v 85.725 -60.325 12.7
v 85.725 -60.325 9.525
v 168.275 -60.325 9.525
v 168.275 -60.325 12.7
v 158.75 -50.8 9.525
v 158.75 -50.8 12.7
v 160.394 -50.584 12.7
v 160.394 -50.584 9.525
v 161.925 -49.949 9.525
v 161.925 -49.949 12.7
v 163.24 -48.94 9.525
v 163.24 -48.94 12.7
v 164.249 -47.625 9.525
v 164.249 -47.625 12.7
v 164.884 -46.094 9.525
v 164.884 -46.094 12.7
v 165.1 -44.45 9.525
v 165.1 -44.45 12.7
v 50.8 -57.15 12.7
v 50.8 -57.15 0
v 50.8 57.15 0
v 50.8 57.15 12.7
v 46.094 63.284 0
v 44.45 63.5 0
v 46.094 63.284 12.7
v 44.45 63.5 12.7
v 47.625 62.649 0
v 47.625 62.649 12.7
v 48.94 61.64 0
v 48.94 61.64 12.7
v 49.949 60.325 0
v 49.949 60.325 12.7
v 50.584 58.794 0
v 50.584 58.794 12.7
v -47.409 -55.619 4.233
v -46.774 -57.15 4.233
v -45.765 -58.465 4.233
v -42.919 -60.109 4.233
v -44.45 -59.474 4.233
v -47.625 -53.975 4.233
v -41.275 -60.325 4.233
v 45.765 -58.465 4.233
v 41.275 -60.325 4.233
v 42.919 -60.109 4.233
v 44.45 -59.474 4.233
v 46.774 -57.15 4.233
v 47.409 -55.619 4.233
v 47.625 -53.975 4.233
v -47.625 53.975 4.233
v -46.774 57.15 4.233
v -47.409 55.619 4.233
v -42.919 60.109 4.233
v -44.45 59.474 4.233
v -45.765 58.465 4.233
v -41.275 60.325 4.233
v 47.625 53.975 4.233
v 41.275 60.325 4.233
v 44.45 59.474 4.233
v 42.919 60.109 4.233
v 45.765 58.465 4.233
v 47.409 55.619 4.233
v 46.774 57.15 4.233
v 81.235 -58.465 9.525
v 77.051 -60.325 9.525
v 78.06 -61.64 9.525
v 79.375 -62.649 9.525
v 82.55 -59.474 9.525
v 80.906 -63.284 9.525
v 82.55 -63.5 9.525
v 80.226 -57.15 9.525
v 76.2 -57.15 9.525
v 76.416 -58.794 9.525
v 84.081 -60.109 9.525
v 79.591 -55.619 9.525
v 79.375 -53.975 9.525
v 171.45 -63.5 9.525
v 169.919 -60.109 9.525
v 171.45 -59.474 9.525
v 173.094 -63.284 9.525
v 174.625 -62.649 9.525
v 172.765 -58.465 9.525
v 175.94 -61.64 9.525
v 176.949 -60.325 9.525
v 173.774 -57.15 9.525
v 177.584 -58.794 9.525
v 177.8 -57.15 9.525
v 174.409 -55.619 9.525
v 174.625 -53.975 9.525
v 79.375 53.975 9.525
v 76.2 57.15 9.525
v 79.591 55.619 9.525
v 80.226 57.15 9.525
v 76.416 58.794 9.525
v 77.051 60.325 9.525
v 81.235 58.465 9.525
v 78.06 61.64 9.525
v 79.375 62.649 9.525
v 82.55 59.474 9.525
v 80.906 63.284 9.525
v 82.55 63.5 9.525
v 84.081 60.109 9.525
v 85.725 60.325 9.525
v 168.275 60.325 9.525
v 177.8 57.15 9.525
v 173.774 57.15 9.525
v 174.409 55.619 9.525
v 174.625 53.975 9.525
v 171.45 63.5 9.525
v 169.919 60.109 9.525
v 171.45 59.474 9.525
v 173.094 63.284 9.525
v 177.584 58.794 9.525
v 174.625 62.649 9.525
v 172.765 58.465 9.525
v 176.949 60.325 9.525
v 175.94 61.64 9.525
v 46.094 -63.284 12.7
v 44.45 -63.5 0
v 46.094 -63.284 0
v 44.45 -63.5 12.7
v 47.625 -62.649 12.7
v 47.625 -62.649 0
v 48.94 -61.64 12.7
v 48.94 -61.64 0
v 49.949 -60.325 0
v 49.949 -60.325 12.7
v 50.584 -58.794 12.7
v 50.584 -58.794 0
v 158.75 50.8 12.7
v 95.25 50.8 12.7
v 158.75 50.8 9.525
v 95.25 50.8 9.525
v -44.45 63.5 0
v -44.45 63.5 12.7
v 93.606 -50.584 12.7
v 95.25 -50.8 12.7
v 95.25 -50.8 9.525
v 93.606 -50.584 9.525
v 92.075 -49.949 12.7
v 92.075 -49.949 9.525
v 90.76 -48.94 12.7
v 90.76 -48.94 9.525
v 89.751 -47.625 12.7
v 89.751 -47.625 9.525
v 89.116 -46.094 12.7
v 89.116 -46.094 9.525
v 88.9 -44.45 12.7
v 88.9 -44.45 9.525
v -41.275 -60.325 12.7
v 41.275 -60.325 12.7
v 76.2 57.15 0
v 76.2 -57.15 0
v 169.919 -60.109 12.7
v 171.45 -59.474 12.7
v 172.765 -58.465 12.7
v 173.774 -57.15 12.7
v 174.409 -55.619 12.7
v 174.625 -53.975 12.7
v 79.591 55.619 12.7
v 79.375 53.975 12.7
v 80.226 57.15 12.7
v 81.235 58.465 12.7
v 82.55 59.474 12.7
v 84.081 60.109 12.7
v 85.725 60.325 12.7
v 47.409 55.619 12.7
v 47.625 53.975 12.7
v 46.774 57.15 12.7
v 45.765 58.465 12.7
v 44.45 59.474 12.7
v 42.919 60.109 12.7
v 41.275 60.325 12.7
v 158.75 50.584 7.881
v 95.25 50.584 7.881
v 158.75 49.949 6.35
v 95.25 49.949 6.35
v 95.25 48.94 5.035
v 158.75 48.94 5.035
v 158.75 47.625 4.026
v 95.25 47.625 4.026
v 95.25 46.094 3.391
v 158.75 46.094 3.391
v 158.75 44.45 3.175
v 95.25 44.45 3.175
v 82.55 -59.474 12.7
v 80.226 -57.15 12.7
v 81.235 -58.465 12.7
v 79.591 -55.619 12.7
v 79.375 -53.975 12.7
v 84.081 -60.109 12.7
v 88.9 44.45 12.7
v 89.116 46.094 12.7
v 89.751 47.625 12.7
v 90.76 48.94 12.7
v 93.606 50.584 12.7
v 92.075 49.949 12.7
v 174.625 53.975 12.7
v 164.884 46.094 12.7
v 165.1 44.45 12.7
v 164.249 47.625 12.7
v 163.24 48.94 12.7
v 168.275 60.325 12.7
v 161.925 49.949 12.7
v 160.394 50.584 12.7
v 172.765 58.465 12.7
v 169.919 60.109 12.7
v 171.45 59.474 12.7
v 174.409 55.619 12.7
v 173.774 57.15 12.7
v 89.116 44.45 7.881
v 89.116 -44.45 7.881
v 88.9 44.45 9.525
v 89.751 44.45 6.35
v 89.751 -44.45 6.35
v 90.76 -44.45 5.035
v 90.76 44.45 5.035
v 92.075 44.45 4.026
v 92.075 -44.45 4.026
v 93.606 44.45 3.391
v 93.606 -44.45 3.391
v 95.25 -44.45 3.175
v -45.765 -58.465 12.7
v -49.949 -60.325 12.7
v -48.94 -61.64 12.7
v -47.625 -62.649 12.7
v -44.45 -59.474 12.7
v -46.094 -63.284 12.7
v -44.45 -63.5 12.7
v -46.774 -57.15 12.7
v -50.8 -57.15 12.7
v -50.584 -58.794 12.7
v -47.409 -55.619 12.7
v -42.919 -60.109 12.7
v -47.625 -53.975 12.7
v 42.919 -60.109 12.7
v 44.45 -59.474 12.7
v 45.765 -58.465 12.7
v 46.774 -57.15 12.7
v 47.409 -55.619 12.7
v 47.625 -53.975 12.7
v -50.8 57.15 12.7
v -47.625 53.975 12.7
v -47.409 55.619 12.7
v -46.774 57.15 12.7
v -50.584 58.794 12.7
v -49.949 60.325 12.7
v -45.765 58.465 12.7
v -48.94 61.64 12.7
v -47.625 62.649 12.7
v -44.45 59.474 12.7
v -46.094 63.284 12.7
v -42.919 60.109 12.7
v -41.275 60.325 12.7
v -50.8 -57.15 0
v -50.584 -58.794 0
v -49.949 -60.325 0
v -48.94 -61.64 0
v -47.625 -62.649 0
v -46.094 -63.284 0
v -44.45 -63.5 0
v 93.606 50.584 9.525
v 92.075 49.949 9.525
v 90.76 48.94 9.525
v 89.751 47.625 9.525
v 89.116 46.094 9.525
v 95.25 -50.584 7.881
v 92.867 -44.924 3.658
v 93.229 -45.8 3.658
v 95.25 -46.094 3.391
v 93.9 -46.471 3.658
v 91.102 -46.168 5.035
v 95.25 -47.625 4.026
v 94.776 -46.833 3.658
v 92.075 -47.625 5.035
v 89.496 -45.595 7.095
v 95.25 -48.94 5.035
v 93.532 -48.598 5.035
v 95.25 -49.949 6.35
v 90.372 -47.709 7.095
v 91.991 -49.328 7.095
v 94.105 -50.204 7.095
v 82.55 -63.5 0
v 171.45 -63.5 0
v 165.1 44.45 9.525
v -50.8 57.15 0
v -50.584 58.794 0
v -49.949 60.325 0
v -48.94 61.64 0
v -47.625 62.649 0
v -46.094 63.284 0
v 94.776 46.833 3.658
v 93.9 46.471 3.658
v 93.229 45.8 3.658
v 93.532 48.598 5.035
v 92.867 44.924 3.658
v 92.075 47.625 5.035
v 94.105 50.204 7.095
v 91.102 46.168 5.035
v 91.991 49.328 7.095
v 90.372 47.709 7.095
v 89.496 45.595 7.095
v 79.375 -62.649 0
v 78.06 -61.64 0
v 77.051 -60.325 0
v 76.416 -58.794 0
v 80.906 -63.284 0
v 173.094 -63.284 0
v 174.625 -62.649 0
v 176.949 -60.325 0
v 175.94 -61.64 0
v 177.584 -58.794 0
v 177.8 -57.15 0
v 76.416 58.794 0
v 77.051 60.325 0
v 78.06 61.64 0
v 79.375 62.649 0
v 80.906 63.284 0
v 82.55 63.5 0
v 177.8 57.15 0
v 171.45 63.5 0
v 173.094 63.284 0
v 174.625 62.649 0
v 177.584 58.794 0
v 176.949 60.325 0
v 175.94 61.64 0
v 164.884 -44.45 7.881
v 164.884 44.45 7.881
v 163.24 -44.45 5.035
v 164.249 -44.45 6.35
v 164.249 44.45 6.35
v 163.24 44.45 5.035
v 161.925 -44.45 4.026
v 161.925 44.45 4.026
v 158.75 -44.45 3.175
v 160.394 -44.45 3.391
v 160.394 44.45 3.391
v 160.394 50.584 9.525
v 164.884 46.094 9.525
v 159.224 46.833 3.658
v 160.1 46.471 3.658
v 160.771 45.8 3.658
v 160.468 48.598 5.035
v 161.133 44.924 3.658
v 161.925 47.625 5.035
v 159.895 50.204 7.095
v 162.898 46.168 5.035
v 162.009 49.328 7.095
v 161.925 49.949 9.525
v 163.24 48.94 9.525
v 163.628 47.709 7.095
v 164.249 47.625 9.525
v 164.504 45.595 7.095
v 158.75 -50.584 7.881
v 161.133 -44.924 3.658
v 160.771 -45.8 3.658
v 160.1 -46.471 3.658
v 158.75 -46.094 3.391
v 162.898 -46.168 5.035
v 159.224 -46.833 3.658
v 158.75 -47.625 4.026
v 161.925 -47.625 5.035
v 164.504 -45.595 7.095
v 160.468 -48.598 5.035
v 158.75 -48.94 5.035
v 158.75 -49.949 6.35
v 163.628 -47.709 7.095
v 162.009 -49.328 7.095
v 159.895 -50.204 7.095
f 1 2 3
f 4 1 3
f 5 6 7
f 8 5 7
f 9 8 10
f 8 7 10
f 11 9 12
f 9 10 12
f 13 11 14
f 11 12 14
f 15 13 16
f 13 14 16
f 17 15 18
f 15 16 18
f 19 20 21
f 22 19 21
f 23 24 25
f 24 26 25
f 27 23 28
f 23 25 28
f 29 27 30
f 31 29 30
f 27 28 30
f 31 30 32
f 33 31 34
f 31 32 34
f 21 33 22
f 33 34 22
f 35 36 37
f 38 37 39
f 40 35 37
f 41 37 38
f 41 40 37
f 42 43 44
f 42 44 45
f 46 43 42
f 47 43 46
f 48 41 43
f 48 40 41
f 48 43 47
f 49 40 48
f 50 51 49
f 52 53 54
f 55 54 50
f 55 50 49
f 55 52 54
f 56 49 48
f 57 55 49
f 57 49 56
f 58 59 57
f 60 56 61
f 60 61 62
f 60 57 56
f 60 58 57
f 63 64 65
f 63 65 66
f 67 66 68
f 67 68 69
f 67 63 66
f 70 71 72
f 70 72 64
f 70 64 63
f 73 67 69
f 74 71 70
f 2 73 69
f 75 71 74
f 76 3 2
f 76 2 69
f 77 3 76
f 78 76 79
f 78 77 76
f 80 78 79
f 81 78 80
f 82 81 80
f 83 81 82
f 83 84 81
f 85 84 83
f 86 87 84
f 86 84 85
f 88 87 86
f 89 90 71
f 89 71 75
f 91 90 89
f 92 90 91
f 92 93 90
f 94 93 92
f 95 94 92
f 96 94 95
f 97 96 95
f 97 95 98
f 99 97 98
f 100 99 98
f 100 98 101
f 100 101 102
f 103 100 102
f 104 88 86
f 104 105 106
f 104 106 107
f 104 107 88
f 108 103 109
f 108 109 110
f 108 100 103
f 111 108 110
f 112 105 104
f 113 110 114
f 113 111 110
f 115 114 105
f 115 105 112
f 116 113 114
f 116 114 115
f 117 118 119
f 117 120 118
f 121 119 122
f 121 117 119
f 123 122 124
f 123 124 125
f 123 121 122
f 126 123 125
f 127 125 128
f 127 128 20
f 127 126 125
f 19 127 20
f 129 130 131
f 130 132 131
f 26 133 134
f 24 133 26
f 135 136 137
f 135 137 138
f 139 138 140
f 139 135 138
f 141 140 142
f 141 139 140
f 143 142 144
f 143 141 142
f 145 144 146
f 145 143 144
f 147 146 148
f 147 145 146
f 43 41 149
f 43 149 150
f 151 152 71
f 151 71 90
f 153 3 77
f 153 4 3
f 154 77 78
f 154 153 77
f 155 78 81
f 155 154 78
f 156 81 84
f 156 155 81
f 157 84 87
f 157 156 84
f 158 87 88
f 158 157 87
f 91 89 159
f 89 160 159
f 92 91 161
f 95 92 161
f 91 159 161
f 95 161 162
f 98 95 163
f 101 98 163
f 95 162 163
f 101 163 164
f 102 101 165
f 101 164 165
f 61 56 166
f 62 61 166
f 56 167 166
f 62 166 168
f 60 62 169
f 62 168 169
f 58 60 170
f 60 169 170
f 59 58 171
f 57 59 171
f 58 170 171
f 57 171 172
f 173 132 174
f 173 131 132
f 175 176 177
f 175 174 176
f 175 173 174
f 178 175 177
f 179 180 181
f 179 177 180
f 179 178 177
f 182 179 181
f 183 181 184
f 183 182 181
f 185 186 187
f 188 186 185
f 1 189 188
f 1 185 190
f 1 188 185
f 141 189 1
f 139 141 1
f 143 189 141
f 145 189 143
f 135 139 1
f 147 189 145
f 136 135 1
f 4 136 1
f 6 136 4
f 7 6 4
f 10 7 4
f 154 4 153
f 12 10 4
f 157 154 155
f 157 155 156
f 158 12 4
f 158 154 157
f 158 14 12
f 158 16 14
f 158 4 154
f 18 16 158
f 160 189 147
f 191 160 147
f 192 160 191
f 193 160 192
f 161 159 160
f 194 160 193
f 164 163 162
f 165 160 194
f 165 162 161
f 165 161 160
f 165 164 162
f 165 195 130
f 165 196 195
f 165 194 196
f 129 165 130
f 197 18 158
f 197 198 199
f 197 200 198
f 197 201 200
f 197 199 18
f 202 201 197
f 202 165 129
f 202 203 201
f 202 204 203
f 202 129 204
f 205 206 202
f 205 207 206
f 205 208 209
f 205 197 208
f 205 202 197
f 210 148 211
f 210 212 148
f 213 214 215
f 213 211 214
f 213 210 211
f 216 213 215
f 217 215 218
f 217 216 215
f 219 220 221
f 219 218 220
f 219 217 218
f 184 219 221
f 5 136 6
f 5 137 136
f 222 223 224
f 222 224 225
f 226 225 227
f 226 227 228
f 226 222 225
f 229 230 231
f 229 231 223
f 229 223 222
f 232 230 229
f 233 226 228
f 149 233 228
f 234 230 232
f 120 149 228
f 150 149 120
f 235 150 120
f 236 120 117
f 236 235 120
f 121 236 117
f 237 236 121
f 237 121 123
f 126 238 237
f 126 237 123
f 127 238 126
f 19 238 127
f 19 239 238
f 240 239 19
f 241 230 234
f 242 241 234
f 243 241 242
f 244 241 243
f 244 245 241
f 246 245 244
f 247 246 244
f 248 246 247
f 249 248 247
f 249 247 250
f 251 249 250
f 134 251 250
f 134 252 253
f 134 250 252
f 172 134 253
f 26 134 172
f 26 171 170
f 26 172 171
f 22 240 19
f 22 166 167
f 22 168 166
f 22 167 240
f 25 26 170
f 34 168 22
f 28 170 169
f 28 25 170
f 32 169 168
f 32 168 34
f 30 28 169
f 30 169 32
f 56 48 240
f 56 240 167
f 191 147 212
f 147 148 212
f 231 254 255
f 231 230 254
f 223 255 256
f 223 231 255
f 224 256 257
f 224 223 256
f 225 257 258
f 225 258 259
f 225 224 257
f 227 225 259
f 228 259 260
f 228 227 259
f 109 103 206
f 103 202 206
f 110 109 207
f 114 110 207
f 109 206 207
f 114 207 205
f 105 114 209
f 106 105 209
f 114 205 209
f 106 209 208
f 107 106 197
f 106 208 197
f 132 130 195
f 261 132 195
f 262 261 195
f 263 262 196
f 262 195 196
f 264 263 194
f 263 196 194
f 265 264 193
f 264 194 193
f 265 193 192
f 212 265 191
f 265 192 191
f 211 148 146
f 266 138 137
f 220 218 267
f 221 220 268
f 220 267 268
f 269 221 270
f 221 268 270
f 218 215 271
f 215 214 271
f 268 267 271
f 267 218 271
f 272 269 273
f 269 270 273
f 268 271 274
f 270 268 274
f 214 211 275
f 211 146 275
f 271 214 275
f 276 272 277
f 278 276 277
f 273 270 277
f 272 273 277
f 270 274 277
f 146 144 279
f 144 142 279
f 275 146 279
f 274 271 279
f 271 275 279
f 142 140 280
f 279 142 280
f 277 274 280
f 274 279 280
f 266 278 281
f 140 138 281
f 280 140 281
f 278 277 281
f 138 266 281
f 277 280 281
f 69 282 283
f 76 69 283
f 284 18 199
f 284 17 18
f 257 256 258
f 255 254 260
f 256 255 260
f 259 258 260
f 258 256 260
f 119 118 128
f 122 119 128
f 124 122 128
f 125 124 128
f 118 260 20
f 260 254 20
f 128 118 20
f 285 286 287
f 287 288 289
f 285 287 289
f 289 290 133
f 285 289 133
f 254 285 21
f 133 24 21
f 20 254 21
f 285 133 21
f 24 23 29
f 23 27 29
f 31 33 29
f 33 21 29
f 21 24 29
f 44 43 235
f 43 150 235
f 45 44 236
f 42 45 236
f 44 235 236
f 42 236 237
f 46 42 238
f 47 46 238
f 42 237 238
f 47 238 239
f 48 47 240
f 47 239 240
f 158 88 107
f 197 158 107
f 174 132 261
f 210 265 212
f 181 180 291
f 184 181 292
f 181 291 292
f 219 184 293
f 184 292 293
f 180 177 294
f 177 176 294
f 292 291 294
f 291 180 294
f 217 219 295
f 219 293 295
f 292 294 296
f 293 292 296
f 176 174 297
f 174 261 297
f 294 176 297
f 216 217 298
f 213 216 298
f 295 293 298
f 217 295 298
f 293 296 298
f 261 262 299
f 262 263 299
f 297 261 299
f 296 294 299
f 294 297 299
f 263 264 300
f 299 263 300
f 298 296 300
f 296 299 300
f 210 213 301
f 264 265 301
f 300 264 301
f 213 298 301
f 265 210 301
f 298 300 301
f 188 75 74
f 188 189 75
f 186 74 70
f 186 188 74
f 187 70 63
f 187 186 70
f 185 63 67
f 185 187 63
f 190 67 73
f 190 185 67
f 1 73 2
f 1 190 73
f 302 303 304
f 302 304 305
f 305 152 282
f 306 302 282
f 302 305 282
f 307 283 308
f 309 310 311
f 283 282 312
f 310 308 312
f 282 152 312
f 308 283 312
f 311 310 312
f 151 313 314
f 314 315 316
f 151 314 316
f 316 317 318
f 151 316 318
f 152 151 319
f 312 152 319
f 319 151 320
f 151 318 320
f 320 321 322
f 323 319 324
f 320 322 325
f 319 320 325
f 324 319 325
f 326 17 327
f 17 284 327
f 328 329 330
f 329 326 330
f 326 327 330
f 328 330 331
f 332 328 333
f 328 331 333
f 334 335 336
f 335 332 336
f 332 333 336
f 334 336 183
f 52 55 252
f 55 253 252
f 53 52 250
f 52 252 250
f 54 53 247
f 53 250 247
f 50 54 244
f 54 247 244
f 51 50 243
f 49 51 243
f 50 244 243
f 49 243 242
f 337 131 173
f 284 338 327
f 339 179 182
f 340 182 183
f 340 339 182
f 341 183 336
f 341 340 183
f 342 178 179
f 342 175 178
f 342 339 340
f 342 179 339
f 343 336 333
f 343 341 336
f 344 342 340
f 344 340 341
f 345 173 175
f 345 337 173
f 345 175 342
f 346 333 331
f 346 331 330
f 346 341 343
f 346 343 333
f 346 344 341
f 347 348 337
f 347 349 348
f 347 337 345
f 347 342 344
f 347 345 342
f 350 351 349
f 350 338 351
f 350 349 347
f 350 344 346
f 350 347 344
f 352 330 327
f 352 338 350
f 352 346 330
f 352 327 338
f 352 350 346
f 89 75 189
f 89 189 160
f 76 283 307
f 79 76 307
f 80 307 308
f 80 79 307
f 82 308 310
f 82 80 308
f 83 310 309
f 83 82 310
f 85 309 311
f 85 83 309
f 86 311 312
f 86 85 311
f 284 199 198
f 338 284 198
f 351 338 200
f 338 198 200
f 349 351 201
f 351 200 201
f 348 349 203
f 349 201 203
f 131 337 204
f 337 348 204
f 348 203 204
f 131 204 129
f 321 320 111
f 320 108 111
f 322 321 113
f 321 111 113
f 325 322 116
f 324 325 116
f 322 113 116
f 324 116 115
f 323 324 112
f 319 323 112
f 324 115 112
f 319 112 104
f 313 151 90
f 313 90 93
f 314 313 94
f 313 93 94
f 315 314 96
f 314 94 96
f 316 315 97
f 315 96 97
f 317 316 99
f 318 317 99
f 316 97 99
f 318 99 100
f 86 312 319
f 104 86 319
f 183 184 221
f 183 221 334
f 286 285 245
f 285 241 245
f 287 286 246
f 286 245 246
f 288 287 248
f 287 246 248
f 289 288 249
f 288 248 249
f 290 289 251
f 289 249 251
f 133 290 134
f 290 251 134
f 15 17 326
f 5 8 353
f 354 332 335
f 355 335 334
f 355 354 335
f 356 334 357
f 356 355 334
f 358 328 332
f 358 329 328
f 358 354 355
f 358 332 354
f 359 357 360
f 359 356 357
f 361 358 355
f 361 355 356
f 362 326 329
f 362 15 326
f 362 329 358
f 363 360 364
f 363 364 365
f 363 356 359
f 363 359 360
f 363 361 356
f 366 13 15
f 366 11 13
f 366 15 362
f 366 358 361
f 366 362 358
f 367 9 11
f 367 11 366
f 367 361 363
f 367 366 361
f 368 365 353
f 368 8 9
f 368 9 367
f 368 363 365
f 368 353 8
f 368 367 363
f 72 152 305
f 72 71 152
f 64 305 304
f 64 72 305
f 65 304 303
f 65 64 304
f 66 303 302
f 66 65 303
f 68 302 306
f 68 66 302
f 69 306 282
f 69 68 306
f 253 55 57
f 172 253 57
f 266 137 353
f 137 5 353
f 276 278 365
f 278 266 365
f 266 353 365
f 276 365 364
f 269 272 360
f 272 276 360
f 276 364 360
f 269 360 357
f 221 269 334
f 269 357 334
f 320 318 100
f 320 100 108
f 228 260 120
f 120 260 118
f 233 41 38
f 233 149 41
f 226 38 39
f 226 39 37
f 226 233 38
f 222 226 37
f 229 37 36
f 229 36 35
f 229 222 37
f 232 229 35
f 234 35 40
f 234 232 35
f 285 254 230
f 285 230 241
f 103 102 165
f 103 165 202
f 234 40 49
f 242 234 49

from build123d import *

# Parameters (mm, degrees)
F2_W     = 101.6
F2_H     = 127
F2_W_2   = 95.25
F2_H_2   = 120.65
F3_DEPTH = 9.525
F2_W_3   = 76.2
F2_H_3   = 101.6
F4_DEPTH = 3.175
F5_DEPTH = 12.7
F7_DEPTH = 4.2333333333
F8_DEPTH = 12.7
F10_R    = 6.35
F11_R    = 6.35


# Not quite as in the source:
# - a variable given as a bare number and used for a length is read in inches; the dataset says mm whatever the document's units were


with BuildPart() as f3:
    # F2 (on Top) → F3 (new body)
    with BuildSketch(Plane.XY):
        Rectangle(F2_W, F2_H)
        Rectangle(F2_W_2, F2_H_2, mode=Mode.SUBTRACT)
    extrude(amount=F3_DEPTH)



with BuildPart() as f4:
    # F2 (on Top) → F4 (new body)
    with BuildSketch(Plane.XY):
        Rectangle(F2_W_3, F2_H_3)
    extrude(amount=F4_DEPTH)


with BuildPart() as f3_1:
    add(f3.part)

    add(f4.part)  # F5 merges F4
    # F2 (on Top) → F5 (join)
    with BuildSketch(Plane.XY):
        Rectangle(F2_W_2, F2_H_2)
        Rectangle(F2_W_3, F2_H_3, mode=Mode.SUBTRACT)
    extrude(amount=F5_DEPTH)


with BuildPart() as f3_2:
    # F6: moved
    add(f3_1.part.moved(Location((127, 0, 0))))

    # F10
    f10_edges = [f3_2.edges().sort_by_distance(p)[0] for p in [
        (177.8, -63.5, 4.7625),
        (174.625, -60.325, 11.1125),
        (165.1, -50.8, 7.9375),
        (76.2, -63.5, 4.7625),
        (79.375, -60.325, 11.1125),
        (88.9, -50.8, 7.9375),
        (76.2, 63.5, 4.7625),
        (79.375, 60.325, 11.1125),
        (88.9, 50.8, 7.9375),
        (177.8, 63.5, 4.7625),
        (174.625, 60.325, 11.1125),
        (165.1, 50.8, 7.9375),
        (127, 50.8, 3.175),
        (165.1, 0, 3.175),
        (88.9, 0, 3.175),
        (127, -50.8, 3.175),
    ]]
    fillet(f10_edges, radius=F10_R)


with BuildPart() as f7:
    # F2 (on Top) → F7 (new body)
    with BuildSketch(Plane.XY):
        Rectangle(F2_W_2, F2_H_2)
        Rectangle(F2_W_3, F2_H_3, mode=Mode.SUBTRACT)
        Rectangle(F2_W_3, F2_H_3)
    extrude(amount=F7_DEPTH)

    # F2 (on Top) → F8 (join)
    with BuildSketch(Plane.XY):
        Rectangle(F2_W, F2_H)
        Rectangle(F2_W_2, F2_H_2, mode=Mode.SUBTRACT)
    extrude(amount=F8_DEPTH)

    # F11
    f11_edges = [f7.edges().sort_by_distance(p)[0] for p in [
        (50.8, 63.5, 6.35),
        (47.625, 60.325, 8.466667),
        (-50.8, 63.5, 6.35),
        (-47.625, 60.325, 8.466667),
        (-50.8, -63.5, 6.35),
        (-47.625, -60.325, 8.466667),
        (47.625, -60.325, 8.466667),
        (50.8, -63.5, 6.35),
    ]]
    fillet(f11_edges, radius=F11_R)


solid = Compound([f3_2.part, f7.part])
